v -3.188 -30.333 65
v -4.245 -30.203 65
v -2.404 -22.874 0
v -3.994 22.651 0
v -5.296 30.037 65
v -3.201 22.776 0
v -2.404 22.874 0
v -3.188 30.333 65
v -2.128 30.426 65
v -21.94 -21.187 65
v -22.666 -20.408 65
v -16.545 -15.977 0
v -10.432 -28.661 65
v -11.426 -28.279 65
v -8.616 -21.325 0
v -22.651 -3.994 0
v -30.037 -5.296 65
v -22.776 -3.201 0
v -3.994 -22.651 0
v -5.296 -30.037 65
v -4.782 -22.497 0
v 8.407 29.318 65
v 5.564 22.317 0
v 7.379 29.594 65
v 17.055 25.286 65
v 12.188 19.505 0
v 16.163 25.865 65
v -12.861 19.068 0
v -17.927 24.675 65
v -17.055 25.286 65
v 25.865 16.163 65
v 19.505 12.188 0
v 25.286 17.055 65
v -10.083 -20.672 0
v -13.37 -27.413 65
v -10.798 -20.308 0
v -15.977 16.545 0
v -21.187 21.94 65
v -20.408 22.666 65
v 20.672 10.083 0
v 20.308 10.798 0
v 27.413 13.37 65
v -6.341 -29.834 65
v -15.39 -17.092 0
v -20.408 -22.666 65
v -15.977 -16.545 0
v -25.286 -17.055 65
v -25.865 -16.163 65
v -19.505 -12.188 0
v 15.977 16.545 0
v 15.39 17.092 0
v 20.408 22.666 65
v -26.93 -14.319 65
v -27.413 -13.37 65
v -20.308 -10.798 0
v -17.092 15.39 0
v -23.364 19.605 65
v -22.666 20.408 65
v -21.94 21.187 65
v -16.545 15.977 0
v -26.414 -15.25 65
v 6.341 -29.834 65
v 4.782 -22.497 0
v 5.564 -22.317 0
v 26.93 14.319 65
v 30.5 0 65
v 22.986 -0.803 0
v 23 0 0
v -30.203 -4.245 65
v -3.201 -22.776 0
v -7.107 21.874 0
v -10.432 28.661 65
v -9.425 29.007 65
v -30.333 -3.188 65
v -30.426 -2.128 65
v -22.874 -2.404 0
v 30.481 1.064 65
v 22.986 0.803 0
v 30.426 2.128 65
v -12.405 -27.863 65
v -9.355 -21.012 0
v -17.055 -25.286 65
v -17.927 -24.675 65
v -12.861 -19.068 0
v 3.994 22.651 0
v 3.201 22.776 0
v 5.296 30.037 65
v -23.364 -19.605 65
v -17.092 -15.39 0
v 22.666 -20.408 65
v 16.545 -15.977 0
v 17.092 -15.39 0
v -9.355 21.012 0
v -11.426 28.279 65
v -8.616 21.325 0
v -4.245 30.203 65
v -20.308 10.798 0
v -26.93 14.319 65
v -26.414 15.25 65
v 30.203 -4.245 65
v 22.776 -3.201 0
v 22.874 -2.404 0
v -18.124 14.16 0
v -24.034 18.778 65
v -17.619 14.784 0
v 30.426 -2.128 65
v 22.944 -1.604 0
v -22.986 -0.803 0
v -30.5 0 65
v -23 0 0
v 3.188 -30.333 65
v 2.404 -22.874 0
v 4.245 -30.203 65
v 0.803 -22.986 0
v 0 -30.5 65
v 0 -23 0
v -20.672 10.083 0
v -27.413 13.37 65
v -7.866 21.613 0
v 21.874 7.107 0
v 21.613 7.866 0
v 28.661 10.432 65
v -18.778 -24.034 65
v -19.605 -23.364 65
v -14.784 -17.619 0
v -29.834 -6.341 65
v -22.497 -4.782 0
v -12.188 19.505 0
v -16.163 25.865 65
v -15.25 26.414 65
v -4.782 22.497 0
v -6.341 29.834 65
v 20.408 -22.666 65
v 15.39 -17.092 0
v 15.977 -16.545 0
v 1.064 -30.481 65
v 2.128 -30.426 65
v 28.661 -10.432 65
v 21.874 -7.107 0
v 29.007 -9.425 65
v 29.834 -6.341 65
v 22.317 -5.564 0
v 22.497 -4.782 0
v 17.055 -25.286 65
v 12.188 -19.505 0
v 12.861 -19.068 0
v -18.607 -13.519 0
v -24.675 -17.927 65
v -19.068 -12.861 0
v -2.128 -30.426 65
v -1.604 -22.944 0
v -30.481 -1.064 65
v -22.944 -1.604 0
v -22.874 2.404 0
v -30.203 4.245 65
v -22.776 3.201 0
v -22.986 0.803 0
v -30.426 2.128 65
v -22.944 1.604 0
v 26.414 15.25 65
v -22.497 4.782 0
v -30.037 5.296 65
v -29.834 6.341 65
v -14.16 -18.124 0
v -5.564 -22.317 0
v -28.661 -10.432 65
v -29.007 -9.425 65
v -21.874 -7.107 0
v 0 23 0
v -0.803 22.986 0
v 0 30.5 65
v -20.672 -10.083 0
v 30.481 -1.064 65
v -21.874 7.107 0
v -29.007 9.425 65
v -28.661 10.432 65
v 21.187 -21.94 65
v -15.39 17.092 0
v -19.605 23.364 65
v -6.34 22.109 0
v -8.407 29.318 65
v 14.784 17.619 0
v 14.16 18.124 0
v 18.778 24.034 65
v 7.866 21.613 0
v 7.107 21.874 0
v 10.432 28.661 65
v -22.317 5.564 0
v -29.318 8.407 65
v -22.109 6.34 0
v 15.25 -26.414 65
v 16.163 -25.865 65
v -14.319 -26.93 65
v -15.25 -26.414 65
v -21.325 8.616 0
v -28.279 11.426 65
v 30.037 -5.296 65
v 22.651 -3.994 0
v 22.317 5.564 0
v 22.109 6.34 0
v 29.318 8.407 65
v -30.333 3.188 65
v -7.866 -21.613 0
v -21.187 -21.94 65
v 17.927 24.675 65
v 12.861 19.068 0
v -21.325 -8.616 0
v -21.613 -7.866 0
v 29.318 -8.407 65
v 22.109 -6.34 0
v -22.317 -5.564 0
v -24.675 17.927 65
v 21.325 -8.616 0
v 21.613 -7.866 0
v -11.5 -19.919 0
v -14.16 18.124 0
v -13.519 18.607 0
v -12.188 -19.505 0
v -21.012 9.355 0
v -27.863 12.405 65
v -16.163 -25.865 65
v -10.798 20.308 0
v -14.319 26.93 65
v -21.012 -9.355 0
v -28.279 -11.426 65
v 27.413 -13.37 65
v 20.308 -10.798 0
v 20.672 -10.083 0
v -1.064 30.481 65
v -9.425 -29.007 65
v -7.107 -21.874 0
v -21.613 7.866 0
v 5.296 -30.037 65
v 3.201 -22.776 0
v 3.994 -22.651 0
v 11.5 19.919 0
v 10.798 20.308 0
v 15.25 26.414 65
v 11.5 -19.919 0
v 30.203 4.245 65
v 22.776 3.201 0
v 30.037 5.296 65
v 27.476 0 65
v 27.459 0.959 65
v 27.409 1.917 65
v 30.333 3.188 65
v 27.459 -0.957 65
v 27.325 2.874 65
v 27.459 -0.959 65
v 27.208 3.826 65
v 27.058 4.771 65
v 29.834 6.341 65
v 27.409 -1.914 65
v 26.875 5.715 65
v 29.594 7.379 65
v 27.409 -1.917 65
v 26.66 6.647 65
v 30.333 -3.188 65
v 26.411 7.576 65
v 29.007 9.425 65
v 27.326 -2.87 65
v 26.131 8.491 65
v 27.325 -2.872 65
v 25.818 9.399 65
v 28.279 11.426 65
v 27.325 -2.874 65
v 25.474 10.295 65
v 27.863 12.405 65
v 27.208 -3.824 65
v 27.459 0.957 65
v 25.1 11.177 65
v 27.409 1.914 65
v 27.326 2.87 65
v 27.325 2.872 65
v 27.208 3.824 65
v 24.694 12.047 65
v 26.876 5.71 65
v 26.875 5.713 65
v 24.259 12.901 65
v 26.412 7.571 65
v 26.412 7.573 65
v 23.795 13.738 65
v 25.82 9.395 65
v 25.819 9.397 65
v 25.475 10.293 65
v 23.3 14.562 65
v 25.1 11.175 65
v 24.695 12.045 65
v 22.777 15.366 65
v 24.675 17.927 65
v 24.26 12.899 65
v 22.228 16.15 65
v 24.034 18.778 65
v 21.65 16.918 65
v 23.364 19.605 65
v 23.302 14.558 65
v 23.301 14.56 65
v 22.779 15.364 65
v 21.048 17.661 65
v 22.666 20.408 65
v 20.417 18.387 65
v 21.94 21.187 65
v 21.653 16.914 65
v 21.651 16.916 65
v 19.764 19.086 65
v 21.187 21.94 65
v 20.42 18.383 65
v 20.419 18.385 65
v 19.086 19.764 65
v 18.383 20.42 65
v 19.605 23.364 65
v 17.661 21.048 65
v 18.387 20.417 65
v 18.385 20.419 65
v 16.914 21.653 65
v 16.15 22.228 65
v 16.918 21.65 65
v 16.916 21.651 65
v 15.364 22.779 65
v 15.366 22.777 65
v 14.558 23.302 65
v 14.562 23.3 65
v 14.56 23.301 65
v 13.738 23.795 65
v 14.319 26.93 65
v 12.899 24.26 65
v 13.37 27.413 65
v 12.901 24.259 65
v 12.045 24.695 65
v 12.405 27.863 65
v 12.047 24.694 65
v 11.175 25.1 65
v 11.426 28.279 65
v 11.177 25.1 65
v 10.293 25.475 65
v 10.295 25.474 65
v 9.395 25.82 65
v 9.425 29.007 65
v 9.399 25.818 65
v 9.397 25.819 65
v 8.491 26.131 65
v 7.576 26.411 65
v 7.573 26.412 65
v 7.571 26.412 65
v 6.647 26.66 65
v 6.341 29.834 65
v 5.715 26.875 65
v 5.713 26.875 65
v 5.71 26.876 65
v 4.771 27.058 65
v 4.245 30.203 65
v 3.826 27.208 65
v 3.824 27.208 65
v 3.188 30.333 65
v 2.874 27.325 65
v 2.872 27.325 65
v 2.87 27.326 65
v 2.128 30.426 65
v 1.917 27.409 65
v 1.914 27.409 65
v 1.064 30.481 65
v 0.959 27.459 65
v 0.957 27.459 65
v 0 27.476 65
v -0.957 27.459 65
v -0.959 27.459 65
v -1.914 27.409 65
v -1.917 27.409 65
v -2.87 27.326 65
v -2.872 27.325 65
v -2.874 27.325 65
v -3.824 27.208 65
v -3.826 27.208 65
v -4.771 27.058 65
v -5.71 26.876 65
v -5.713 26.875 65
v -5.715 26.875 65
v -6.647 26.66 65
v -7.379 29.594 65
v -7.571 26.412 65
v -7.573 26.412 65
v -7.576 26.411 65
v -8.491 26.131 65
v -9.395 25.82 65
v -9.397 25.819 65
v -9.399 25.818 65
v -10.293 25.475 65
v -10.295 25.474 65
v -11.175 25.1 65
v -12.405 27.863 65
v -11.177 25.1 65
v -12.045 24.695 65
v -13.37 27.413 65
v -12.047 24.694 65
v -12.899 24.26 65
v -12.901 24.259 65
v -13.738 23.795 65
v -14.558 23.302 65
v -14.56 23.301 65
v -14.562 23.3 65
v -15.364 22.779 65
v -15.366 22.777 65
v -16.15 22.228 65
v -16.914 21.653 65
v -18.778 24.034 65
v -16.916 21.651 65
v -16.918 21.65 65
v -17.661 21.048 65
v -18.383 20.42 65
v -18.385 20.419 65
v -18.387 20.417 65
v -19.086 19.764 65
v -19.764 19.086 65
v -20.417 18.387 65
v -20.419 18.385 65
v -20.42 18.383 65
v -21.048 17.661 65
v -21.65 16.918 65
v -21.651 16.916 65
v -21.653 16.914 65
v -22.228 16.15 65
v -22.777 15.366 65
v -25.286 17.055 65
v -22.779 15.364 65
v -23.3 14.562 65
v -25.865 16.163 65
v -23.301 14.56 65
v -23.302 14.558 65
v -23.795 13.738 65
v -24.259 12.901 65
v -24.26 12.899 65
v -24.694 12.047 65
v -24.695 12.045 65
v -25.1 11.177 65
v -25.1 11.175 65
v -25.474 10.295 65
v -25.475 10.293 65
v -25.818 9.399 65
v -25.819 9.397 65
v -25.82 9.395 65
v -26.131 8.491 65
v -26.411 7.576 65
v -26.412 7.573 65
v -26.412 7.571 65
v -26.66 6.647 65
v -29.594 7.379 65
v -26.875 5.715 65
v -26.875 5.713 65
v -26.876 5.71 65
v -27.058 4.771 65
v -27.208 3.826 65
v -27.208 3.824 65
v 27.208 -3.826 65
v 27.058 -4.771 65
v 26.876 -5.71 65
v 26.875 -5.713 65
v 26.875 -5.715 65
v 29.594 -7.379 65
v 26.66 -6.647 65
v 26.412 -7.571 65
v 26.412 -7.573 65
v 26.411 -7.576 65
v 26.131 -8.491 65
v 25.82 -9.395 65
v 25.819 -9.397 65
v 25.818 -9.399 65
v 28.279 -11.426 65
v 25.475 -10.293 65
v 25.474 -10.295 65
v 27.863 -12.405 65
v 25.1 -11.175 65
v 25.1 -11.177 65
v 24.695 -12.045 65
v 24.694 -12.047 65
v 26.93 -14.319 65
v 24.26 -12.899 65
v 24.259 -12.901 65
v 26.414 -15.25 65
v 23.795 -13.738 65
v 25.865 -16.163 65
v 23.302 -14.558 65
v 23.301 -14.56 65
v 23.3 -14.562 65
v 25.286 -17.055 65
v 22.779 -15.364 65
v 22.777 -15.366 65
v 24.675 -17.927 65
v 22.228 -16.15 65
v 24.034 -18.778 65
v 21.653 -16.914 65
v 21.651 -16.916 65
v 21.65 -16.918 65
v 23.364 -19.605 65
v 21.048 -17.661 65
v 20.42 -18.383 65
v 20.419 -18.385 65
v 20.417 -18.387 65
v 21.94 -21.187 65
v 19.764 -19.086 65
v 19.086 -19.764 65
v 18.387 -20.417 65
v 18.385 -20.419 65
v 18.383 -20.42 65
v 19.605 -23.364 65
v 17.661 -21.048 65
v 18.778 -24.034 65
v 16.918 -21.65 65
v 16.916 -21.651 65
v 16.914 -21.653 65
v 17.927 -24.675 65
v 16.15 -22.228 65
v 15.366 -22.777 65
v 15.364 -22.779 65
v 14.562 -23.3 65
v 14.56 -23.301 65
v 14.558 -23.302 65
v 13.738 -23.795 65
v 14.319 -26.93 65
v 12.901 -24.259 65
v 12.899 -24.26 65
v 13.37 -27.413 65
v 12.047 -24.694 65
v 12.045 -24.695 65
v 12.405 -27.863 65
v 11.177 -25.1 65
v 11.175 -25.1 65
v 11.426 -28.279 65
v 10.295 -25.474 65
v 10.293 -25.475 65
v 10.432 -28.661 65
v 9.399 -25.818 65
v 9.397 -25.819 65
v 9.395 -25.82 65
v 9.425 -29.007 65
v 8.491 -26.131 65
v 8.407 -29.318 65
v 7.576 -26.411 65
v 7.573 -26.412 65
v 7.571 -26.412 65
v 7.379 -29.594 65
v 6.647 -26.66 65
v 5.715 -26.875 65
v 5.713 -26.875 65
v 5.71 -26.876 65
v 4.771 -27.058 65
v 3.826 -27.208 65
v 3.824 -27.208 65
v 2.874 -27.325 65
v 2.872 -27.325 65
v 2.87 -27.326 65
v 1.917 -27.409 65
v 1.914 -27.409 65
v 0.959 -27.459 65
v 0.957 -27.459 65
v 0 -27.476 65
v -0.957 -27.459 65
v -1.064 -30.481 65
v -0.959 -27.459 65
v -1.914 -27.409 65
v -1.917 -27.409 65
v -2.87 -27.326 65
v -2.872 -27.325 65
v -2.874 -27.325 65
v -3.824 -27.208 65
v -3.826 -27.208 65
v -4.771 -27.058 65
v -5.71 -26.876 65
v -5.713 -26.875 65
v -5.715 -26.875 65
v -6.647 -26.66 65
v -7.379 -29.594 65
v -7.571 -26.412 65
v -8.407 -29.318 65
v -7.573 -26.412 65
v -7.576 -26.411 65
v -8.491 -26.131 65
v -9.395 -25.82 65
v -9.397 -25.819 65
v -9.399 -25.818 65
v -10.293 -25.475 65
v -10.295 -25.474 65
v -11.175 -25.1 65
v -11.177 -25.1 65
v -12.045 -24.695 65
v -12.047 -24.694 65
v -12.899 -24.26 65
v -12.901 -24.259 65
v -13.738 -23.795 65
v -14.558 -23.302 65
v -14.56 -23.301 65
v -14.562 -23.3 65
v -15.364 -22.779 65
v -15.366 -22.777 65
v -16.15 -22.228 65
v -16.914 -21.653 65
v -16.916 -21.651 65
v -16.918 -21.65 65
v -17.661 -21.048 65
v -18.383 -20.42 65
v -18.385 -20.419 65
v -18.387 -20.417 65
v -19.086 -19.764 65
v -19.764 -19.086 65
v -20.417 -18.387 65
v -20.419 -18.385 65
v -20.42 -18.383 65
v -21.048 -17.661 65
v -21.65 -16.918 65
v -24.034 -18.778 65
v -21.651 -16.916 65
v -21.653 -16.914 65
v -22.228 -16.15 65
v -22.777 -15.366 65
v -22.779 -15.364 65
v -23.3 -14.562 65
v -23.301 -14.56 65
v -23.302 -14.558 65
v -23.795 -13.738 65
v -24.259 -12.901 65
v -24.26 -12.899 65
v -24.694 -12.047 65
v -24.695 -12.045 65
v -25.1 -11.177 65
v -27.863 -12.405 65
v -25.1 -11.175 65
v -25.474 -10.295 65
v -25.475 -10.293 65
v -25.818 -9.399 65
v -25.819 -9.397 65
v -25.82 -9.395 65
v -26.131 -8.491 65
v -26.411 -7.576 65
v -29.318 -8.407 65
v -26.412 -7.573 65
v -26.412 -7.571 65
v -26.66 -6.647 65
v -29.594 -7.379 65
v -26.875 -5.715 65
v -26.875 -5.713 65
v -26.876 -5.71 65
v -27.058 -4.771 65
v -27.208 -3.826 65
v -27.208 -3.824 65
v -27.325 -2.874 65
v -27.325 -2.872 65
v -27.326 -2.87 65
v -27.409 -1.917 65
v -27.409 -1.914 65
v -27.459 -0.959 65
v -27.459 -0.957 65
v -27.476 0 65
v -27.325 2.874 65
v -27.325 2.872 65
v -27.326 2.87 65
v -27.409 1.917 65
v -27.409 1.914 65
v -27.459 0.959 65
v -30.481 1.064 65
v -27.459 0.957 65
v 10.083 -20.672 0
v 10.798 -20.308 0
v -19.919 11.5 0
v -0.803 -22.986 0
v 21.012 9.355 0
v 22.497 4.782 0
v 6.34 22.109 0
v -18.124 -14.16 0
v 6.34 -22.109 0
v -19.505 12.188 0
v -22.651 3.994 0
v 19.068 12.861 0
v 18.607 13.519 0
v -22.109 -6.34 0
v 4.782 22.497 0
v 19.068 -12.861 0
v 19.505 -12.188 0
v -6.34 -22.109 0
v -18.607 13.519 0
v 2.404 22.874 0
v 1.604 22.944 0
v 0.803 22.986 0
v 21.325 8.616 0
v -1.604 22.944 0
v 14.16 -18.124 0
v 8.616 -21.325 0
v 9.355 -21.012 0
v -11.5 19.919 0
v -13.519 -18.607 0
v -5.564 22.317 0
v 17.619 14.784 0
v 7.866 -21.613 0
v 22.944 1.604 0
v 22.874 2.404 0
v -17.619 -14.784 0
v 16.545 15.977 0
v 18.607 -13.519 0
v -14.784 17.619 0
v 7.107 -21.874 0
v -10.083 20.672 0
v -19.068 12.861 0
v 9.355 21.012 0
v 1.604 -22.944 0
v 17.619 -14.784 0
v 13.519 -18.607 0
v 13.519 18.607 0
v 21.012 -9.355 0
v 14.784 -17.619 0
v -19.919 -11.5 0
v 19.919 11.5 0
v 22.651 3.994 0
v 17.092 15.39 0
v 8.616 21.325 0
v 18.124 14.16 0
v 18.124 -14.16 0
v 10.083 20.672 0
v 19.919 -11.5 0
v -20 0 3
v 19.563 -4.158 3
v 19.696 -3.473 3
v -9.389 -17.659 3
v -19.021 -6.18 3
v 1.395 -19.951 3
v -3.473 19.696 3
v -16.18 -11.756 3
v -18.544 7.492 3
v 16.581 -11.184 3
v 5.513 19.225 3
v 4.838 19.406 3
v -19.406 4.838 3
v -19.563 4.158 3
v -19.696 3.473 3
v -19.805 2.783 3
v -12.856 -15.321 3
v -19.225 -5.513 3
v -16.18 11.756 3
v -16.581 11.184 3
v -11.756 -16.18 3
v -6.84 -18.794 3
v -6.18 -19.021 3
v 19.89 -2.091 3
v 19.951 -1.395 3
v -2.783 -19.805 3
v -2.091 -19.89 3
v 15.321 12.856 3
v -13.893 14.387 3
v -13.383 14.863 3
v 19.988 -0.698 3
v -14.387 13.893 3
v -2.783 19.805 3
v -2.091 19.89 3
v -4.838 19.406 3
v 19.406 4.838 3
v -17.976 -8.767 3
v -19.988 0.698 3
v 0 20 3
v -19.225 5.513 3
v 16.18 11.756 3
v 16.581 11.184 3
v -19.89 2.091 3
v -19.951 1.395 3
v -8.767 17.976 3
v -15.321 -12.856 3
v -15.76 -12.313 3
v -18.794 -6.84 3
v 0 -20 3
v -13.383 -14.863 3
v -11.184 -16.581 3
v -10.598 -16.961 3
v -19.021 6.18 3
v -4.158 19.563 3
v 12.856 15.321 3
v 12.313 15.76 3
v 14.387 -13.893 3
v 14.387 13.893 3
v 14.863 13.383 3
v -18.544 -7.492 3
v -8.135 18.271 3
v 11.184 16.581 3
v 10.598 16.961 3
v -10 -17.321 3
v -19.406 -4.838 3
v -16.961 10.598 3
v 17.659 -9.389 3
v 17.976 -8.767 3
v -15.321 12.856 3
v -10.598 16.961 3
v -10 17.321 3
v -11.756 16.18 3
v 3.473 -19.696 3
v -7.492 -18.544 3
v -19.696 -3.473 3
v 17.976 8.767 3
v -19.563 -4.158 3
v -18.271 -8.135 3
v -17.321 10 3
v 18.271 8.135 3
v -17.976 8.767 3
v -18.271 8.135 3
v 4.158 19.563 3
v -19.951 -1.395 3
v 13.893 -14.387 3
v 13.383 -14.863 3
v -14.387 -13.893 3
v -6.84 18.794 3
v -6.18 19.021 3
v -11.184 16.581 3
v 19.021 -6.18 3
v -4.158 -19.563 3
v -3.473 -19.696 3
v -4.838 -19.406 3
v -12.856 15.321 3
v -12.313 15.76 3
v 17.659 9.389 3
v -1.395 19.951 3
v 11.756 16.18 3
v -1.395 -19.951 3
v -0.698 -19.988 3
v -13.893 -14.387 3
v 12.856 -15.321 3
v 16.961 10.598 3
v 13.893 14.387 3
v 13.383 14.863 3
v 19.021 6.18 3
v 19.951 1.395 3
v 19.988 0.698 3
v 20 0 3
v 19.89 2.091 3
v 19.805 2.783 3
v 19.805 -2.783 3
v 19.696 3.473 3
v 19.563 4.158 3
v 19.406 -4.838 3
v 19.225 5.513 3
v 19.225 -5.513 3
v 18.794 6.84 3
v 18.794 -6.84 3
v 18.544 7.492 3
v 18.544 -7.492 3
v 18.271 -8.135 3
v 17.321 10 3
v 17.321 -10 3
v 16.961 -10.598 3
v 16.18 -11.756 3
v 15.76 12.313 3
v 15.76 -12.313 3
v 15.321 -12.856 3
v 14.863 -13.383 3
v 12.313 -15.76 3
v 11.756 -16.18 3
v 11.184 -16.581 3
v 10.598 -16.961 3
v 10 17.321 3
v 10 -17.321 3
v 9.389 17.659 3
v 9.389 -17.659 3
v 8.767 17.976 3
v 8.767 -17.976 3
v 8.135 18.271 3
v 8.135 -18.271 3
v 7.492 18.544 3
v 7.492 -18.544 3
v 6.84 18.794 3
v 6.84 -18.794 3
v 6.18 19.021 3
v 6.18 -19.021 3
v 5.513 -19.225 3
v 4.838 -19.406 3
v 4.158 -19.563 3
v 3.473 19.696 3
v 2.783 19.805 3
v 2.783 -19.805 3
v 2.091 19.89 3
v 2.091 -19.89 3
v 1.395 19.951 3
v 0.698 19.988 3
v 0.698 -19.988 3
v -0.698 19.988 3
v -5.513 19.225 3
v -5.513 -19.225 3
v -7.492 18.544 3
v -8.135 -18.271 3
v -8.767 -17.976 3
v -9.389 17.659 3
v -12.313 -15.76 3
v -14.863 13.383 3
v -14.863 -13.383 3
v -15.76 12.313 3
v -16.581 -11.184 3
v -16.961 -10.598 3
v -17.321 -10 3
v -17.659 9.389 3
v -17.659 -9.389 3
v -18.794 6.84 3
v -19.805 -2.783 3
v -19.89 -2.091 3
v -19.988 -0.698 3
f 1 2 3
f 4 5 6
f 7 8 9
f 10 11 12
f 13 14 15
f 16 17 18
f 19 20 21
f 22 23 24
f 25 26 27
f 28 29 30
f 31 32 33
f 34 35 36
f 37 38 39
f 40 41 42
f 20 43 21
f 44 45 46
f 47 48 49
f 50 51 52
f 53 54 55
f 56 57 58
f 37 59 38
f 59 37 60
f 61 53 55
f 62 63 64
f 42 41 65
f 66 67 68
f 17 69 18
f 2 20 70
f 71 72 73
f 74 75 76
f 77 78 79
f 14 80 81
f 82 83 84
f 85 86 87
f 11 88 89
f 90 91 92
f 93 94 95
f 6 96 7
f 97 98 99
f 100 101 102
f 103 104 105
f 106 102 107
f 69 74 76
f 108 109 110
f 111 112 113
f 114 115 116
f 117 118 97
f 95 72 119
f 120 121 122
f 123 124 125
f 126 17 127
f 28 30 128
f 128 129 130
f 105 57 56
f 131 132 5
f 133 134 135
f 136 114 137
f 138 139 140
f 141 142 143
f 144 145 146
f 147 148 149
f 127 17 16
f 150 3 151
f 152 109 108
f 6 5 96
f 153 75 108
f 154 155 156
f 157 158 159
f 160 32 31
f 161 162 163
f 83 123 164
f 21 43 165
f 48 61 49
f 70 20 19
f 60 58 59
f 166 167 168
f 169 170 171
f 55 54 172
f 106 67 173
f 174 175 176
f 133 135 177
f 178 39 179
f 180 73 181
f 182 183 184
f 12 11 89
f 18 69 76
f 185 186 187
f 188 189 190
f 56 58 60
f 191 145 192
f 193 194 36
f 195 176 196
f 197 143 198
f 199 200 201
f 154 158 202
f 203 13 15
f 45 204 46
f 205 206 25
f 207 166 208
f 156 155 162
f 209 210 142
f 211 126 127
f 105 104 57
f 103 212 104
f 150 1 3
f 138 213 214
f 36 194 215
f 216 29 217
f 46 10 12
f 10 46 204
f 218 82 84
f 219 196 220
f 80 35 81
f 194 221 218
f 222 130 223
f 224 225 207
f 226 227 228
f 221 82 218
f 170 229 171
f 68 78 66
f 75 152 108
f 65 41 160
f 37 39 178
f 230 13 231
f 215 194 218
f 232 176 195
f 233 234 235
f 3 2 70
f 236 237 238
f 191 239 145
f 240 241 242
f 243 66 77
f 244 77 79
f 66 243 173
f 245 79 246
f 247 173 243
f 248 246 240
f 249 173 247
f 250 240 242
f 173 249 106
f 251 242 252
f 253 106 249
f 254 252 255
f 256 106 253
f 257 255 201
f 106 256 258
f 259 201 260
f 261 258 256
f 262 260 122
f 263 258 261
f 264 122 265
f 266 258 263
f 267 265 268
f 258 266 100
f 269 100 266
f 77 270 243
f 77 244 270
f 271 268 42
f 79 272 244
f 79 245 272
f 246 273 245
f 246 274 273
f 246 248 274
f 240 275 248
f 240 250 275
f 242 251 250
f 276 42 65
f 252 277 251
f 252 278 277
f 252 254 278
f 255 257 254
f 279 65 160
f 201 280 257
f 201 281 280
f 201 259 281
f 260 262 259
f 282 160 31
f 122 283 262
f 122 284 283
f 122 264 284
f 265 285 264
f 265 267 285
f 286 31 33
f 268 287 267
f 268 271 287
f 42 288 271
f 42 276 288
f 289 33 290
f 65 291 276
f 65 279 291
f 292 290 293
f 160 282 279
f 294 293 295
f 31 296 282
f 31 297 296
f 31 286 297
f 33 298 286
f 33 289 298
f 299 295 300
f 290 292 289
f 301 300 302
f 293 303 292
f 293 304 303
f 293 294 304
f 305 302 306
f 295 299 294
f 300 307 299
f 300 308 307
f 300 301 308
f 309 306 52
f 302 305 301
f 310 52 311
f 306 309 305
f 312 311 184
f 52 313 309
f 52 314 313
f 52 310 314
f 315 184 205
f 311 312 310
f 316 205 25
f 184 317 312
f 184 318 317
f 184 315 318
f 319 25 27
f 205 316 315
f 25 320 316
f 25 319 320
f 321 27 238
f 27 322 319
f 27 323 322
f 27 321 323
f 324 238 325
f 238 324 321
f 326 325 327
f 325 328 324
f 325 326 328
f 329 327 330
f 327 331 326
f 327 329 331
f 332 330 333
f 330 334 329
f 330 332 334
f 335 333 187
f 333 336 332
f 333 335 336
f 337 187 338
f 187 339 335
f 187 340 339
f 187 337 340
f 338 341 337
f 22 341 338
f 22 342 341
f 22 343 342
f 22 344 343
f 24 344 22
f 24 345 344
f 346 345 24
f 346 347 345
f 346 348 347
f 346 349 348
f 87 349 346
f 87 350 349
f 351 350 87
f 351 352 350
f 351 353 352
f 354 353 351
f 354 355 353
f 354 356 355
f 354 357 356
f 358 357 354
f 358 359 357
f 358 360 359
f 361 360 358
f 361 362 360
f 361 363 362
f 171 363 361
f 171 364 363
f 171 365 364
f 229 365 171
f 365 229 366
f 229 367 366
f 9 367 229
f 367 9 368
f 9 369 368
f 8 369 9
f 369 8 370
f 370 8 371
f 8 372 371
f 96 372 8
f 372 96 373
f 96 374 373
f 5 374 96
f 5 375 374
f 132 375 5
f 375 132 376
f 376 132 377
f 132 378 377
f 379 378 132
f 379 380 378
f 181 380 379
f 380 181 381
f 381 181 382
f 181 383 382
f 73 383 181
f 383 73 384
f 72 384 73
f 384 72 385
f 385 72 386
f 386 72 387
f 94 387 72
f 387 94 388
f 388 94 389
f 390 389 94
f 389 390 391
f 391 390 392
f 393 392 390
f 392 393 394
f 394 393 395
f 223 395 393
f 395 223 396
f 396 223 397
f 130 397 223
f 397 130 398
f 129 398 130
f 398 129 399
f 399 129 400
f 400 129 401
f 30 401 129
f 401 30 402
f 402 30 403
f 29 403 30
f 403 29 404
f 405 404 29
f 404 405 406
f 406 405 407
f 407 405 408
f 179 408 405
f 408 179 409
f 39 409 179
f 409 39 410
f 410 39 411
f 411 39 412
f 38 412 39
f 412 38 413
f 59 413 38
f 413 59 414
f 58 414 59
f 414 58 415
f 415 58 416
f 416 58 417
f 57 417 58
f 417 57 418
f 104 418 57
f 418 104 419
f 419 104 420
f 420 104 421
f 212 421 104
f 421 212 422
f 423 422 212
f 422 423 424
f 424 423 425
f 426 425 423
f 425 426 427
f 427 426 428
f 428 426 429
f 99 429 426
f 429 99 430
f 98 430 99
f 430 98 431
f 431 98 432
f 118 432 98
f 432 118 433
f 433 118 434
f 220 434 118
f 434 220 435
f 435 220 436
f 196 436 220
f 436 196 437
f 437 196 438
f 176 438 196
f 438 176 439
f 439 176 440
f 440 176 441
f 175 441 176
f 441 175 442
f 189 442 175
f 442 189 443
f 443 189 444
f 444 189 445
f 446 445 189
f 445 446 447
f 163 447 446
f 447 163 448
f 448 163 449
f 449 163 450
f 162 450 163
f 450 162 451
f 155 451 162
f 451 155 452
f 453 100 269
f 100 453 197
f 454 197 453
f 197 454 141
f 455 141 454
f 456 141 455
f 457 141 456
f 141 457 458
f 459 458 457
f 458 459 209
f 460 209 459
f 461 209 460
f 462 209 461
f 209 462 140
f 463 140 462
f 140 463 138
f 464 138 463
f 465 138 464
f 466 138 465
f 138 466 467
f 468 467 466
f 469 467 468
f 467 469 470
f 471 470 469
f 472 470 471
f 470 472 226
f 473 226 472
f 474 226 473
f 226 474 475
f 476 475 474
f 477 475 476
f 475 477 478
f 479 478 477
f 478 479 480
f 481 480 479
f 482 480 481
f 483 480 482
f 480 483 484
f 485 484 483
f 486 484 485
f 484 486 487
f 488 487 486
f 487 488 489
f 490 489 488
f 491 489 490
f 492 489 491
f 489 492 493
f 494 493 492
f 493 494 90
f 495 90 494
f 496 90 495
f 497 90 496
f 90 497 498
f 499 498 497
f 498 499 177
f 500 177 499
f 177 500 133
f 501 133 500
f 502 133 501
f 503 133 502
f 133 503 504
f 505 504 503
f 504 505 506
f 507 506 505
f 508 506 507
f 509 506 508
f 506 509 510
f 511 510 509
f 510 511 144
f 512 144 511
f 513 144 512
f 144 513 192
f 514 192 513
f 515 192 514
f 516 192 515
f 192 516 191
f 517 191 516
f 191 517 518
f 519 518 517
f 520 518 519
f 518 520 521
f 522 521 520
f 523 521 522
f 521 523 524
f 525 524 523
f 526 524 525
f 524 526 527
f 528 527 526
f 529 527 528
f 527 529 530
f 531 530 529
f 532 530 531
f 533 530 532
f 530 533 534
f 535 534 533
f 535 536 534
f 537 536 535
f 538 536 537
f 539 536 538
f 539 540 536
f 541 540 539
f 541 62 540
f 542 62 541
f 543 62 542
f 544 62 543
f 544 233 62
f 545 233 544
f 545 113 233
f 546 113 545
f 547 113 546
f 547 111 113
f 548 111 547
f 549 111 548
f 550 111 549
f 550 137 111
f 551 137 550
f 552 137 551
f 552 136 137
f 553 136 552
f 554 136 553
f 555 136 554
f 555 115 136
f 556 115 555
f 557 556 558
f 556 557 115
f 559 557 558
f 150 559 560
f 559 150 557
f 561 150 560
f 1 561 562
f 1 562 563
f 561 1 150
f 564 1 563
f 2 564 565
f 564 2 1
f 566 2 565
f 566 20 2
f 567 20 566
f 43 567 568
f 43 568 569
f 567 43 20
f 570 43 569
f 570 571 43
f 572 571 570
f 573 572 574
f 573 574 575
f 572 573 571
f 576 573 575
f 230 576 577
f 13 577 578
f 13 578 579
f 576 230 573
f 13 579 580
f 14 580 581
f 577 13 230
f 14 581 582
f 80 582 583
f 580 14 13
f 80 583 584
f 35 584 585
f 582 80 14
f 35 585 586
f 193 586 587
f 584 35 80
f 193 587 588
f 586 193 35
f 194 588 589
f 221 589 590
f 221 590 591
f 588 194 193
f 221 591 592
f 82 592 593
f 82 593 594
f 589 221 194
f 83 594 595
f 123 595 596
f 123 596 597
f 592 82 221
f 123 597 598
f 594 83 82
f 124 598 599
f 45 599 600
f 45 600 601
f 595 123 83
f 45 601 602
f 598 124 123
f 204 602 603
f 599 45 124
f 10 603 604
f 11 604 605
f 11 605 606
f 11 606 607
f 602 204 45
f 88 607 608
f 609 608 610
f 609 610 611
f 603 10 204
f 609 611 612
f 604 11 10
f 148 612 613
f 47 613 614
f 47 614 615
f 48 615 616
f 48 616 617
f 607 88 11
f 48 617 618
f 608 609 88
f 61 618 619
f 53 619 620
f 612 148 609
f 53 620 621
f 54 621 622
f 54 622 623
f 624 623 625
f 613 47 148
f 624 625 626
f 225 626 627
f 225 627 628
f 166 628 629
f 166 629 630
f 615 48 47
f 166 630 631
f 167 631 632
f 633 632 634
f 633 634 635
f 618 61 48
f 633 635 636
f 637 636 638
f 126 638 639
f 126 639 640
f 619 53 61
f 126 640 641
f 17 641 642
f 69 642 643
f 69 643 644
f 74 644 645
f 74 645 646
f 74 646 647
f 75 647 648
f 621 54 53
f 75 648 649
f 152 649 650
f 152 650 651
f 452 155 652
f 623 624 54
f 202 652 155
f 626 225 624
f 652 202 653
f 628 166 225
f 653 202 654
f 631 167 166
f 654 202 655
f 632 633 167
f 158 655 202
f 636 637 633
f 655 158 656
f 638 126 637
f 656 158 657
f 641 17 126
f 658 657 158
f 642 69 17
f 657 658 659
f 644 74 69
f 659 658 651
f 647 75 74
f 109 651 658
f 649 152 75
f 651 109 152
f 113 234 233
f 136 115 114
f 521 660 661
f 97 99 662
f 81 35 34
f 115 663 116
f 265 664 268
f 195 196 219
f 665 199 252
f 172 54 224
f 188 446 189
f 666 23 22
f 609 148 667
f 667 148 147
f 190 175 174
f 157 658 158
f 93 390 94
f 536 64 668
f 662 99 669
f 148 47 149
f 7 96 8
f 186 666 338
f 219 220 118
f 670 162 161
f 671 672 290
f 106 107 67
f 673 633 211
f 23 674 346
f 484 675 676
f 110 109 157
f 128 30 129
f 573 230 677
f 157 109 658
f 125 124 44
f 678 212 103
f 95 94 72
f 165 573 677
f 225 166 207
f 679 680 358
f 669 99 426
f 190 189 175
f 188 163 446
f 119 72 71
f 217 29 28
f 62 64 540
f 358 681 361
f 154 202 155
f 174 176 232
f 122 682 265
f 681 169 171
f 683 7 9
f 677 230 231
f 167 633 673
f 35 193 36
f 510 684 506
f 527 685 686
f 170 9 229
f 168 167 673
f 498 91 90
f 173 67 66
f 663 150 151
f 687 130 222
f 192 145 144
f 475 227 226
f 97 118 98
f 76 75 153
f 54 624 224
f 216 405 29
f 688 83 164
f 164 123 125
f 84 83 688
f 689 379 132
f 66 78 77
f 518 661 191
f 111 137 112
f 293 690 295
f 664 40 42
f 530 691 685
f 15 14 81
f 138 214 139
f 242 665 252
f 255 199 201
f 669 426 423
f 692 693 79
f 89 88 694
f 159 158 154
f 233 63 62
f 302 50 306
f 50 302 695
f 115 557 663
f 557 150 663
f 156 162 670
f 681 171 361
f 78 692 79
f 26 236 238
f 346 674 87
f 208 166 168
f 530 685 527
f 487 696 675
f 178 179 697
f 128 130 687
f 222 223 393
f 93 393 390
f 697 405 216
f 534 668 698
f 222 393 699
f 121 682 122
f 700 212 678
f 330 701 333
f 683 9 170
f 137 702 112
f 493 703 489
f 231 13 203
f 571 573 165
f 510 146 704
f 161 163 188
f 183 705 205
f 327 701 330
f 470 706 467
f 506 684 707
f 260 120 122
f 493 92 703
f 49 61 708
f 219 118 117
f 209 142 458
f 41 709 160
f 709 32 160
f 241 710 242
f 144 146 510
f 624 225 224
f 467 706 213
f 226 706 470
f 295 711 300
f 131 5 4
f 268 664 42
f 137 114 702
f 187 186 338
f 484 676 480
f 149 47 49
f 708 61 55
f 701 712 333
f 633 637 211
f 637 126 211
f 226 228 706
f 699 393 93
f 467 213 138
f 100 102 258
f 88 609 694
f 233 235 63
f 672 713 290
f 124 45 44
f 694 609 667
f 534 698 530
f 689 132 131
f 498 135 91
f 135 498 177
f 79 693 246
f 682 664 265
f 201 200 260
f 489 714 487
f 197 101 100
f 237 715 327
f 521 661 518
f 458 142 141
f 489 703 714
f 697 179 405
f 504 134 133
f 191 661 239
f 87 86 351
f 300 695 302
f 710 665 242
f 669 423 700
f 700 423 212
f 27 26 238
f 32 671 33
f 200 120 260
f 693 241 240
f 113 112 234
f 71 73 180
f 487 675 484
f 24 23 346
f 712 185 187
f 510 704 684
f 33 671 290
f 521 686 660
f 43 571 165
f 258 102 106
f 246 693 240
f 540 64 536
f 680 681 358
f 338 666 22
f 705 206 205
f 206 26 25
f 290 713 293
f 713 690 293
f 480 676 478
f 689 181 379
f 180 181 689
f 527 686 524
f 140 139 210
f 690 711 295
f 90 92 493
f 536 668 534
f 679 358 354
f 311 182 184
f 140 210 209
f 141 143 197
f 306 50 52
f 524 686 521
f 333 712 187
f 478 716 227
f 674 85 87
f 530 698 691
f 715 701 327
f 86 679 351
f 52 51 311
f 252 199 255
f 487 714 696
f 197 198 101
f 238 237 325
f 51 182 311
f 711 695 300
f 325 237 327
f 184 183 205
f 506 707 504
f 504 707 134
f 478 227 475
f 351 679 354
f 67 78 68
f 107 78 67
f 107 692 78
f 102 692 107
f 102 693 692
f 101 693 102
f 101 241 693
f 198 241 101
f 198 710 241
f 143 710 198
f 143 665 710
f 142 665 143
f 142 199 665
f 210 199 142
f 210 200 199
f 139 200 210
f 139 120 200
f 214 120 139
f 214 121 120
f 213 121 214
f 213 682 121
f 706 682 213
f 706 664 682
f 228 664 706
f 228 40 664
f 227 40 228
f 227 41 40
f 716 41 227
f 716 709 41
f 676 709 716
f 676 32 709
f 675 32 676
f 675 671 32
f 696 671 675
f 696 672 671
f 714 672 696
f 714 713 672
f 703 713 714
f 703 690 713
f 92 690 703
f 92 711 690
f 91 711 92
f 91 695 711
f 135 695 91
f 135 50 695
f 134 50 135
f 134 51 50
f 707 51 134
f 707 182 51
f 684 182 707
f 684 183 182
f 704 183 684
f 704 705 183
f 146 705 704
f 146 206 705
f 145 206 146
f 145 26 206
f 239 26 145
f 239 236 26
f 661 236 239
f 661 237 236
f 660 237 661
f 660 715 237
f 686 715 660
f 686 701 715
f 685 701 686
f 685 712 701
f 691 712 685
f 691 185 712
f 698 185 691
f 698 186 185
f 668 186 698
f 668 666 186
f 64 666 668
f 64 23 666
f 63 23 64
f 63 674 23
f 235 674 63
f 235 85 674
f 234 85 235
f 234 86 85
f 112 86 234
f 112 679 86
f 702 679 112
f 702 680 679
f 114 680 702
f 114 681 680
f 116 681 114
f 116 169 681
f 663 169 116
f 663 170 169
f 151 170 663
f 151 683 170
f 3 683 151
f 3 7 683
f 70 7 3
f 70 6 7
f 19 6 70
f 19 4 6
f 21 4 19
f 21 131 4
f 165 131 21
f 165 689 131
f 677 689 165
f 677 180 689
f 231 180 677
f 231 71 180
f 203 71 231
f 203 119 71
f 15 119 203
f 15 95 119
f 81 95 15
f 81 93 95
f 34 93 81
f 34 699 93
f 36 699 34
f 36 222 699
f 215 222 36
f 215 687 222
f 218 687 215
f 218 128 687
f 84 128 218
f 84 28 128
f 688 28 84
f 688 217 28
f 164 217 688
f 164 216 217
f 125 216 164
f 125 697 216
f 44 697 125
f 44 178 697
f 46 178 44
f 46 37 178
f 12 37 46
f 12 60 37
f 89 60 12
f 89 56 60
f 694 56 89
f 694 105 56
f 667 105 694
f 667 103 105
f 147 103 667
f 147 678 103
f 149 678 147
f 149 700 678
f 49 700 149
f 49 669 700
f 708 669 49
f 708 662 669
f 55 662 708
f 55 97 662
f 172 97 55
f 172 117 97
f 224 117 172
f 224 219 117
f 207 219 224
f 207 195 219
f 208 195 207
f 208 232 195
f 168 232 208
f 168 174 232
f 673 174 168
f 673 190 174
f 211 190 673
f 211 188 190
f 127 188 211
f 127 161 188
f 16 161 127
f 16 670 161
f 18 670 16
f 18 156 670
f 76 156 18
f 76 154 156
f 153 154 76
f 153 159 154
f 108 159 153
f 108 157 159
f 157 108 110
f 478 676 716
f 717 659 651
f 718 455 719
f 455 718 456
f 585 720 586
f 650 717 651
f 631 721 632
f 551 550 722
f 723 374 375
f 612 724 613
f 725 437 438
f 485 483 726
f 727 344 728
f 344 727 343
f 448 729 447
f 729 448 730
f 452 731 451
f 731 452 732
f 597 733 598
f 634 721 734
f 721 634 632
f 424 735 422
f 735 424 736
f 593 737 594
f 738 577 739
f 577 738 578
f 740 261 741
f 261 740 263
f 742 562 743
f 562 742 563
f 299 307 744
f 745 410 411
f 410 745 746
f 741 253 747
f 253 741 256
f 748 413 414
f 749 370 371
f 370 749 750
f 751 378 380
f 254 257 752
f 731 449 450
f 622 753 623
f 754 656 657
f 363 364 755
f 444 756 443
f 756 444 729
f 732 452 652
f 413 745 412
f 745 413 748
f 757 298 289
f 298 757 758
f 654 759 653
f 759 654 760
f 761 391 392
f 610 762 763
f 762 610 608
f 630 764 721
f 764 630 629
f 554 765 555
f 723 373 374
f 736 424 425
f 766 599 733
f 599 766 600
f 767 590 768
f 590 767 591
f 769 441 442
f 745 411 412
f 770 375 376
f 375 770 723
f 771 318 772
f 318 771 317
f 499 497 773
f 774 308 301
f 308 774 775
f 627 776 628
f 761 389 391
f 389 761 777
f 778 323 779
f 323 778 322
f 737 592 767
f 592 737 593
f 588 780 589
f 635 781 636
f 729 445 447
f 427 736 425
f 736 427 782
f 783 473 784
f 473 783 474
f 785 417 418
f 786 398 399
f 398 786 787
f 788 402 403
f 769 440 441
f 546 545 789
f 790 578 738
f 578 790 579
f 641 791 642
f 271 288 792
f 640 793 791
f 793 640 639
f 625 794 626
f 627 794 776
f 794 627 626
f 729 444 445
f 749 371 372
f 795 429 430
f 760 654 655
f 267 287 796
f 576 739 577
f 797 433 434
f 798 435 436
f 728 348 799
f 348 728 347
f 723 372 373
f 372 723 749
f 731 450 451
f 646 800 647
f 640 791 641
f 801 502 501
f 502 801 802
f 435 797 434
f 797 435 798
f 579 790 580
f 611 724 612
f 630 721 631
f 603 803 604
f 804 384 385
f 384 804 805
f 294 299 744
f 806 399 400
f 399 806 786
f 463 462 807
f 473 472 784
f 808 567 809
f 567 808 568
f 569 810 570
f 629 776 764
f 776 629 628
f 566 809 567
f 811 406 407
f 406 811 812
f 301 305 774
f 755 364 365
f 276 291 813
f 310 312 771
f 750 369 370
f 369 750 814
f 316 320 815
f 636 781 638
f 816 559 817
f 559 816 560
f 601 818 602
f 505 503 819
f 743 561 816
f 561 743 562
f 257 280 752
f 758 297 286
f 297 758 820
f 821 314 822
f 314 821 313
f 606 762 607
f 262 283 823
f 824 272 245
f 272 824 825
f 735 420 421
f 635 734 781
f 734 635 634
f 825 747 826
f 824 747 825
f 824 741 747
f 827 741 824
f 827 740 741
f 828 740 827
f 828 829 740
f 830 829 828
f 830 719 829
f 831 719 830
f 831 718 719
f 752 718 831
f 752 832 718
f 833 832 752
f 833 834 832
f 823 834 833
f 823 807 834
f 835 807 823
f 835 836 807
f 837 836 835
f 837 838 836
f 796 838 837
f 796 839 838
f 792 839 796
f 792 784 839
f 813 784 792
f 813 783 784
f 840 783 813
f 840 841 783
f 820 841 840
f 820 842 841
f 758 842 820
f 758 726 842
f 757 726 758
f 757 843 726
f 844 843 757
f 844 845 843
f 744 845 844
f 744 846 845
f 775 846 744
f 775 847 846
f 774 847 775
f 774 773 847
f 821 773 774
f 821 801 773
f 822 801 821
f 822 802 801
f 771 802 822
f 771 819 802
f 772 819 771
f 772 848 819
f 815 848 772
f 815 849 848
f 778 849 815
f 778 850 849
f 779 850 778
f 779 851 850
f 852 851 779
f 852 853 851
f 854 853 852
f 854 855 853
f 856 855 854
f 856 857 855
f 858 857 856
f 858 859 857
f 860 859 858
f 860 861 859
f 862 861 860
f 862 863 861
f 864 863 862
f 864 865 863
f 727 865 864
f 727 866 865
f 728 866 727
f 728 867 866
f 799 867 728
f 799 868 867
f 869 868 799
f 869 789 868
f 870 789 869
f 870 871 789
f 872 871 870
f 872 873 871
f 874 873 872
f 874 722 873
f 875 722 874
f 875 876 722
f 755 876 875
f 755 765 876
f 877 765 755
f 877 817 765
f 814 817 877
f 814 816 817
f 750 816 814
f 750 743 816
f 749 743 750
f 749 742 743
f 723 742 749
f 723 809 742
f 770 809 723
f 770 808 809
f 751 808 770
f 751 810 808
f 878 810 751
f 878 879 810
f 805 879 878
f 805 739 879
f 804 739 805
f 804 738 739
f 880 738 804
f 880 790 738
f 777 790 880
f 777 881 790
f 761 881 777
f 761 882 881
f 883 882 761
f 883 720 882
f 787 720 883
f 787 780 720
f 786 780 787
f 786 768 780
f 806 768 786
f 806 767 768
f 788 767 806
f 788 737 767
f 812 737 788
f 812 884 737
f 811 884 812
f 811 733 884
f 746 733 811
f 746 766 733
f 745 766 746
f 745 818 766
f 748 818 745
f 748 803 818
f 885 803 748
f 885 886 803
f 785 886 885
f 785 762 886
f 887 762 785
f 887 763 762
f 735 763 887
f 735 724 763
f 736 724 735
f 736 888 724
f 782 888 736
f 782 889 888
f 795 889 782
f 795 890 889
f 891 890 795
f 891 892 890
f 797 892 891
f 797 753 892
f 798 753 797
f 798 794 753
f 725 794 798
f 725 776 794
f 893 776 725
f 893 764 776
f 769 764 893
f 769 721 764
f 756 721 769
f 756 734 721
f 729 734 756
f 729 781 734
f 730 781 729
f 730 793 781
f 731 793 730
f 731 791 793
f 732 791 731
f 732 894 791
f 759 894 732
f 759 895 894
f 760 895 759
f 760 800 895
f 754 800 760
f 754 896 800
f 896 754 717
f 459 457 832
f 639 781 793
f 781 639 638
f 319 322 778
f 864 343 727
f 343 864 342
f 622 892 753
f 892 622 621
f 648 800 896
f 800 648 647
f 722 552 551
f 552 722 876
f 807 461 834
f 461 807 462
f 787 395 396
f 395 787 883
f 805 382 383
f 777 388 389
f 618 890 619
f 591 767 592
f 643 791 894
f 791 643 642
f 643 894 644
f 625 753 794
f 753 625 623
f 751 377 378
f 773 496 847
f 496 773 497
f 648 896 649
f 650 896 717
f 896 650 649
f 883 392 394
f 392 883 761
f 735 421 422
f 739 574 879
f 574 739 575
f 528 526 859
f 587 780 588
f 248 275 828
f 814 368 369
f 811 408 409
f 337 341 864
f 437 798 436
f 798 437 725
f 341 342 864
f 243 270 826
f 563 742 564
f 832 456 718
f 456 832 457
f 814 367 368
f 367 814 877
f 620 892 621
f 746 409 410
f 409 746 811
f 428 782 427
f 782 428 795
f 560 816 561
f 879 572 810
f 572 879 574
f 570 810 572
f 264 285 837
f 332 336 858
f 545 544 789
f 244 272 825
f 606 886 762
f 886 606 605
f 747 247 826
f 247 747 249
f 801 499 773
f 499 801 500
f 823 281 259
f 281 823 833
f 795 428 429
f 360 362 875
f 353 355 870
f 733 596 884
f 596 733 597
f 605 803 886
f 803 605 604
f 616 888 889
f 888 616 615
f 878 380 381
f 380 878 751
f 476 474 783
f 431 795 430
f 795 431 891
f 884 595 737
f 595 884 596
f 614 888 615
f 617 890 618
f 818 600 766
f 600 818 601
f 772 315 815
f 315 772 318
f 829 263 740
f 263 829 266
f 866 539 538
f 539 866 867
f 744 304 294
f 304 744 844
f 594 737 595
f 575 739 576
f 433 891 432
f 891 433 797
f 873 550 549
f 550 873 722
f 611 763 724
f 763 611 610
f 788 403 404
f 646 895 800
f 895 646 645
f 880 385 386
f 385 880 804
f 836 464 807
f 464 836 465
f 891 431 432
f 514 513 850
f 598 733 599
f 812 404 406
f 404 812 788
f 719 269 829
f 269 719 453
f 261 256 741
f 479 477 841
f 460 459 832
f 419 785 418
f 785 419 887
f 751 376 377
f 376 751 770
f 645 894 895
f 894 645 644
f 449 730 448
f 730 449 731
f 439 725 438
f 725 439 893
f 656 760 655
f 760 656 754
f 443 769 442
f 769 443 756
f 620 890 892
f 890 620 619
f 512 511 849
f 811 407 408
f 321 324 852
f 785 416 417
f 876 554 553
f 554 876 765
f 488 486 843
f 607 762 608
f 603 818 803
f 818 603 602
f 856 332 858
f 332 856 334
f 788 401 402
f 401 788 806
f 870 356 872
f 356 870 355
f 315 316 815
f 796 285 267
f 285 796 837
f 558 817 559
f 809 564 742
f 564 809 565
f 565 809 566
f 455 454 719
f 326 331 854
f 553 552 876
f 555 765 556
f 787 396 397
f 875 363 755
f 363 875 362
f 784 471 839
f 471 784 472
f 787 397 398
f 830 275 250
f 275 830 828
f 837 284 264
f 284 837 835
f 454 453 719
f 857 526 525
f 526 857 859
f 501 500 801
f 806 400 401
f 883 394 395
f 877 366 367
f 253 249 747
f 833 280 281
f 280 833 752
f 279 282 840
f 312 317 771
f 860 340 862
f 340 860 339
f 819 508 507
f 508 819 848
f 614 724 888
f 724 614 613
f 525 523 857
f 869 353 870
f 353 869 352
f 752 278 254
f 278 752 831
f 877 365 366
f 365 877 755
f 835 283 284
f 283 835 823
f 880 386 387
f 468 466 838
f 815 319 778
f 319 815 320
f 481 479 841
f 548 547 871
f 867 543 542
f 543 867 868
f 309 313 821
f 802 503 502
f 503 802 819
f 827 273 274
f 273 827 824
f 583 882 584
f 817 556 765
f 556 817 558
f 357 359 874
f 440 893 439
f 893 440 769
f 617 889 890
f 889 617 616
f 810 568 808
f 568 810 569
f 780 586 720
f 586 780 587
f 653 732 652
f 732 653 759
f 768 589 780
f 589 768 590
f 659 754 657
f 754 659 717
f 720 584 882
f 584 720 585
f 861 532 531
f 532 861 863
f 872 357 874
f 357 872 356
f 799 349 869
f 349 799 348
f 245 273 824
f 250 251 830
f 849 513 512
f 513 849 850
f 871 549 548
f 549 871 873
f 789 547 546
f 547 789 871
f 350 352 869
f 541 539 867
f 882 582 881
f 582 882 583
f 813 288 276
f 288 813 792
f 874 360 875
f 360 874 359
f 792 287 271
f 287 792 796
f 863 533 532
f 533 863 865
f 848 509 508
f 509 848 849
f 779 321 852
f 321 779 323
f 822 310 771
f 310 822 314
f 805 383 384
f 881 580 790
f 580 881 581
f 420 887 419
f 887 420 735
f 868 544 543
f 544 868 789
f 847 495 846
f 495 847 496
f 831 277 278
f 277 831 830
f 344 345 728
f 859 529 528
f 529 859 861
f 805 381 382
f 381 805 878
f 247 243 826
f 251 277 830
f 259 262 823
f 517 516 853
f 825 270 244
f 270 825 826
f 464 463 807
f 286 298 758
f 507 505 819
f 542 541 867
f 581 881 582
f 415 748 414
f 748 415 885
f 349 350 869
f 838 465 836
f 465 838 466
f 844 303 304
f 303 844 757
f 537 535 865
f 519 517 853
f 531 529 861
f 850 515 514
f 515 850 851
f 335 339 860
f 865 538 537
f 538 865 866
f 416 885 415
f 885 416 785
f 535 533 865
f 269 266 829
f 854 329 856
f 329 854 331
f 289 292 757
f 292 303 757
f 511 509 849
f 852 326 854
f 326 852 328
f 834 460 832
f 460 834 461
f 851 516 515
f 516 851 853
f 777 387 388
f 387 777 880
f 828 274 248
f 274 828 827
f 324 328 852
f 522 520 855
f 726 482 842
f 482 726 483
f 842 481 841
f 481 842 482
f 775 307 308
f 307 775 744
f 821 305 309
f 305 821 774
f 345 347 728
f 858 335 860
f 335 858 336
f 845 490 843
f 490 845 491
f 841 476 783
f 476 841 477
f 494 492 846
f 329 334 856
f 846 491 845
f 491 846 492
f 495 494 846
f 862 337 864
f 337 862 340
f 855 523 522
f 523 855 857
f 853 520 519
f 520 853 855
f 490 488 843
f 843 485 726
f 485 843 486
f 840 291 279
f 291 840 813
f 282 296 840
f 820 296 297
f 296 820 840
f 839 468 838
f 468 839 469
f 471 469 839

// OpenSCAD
// [FL_INDEX: keywords="openscad, 3d_parametric, Parametrischer_Becher, csg_solid" | COT="Parametric OpenSCAD design from 3DCodeverse"]
// Title: Parametrischer Becher

//Top Diameter
d1=55;
//Bottom Diameter
d2=40;
//Height
h=65;
//Thickness
t=3;

becher(d1=d1,d2=d2,h=h,t=t);

module becher(d1=55,d2=40,h=65,t=3) 
{
  p1=[d2/2,0]; 
  p2=[(d2/2)+t,0]; 
  p3=[(d1/2)+t,h];
  p4=[d1/2,h]; 

  pa=[[0,0],p2,p3,[0,h]];
  pi=[[0,t],[d2/2,t],[d1/2,h+0.2],[0,h+0.2]];

  difference() {
    rotate_extrude($fn=180) polygon(points=pa);
    rotate_extrude($fn=180) polygon(points=pi);
  }
}

// -- This script was derived from becher
// -- (c) 2013 Abdreas Urben (urbenan) 
// -- GPL license
